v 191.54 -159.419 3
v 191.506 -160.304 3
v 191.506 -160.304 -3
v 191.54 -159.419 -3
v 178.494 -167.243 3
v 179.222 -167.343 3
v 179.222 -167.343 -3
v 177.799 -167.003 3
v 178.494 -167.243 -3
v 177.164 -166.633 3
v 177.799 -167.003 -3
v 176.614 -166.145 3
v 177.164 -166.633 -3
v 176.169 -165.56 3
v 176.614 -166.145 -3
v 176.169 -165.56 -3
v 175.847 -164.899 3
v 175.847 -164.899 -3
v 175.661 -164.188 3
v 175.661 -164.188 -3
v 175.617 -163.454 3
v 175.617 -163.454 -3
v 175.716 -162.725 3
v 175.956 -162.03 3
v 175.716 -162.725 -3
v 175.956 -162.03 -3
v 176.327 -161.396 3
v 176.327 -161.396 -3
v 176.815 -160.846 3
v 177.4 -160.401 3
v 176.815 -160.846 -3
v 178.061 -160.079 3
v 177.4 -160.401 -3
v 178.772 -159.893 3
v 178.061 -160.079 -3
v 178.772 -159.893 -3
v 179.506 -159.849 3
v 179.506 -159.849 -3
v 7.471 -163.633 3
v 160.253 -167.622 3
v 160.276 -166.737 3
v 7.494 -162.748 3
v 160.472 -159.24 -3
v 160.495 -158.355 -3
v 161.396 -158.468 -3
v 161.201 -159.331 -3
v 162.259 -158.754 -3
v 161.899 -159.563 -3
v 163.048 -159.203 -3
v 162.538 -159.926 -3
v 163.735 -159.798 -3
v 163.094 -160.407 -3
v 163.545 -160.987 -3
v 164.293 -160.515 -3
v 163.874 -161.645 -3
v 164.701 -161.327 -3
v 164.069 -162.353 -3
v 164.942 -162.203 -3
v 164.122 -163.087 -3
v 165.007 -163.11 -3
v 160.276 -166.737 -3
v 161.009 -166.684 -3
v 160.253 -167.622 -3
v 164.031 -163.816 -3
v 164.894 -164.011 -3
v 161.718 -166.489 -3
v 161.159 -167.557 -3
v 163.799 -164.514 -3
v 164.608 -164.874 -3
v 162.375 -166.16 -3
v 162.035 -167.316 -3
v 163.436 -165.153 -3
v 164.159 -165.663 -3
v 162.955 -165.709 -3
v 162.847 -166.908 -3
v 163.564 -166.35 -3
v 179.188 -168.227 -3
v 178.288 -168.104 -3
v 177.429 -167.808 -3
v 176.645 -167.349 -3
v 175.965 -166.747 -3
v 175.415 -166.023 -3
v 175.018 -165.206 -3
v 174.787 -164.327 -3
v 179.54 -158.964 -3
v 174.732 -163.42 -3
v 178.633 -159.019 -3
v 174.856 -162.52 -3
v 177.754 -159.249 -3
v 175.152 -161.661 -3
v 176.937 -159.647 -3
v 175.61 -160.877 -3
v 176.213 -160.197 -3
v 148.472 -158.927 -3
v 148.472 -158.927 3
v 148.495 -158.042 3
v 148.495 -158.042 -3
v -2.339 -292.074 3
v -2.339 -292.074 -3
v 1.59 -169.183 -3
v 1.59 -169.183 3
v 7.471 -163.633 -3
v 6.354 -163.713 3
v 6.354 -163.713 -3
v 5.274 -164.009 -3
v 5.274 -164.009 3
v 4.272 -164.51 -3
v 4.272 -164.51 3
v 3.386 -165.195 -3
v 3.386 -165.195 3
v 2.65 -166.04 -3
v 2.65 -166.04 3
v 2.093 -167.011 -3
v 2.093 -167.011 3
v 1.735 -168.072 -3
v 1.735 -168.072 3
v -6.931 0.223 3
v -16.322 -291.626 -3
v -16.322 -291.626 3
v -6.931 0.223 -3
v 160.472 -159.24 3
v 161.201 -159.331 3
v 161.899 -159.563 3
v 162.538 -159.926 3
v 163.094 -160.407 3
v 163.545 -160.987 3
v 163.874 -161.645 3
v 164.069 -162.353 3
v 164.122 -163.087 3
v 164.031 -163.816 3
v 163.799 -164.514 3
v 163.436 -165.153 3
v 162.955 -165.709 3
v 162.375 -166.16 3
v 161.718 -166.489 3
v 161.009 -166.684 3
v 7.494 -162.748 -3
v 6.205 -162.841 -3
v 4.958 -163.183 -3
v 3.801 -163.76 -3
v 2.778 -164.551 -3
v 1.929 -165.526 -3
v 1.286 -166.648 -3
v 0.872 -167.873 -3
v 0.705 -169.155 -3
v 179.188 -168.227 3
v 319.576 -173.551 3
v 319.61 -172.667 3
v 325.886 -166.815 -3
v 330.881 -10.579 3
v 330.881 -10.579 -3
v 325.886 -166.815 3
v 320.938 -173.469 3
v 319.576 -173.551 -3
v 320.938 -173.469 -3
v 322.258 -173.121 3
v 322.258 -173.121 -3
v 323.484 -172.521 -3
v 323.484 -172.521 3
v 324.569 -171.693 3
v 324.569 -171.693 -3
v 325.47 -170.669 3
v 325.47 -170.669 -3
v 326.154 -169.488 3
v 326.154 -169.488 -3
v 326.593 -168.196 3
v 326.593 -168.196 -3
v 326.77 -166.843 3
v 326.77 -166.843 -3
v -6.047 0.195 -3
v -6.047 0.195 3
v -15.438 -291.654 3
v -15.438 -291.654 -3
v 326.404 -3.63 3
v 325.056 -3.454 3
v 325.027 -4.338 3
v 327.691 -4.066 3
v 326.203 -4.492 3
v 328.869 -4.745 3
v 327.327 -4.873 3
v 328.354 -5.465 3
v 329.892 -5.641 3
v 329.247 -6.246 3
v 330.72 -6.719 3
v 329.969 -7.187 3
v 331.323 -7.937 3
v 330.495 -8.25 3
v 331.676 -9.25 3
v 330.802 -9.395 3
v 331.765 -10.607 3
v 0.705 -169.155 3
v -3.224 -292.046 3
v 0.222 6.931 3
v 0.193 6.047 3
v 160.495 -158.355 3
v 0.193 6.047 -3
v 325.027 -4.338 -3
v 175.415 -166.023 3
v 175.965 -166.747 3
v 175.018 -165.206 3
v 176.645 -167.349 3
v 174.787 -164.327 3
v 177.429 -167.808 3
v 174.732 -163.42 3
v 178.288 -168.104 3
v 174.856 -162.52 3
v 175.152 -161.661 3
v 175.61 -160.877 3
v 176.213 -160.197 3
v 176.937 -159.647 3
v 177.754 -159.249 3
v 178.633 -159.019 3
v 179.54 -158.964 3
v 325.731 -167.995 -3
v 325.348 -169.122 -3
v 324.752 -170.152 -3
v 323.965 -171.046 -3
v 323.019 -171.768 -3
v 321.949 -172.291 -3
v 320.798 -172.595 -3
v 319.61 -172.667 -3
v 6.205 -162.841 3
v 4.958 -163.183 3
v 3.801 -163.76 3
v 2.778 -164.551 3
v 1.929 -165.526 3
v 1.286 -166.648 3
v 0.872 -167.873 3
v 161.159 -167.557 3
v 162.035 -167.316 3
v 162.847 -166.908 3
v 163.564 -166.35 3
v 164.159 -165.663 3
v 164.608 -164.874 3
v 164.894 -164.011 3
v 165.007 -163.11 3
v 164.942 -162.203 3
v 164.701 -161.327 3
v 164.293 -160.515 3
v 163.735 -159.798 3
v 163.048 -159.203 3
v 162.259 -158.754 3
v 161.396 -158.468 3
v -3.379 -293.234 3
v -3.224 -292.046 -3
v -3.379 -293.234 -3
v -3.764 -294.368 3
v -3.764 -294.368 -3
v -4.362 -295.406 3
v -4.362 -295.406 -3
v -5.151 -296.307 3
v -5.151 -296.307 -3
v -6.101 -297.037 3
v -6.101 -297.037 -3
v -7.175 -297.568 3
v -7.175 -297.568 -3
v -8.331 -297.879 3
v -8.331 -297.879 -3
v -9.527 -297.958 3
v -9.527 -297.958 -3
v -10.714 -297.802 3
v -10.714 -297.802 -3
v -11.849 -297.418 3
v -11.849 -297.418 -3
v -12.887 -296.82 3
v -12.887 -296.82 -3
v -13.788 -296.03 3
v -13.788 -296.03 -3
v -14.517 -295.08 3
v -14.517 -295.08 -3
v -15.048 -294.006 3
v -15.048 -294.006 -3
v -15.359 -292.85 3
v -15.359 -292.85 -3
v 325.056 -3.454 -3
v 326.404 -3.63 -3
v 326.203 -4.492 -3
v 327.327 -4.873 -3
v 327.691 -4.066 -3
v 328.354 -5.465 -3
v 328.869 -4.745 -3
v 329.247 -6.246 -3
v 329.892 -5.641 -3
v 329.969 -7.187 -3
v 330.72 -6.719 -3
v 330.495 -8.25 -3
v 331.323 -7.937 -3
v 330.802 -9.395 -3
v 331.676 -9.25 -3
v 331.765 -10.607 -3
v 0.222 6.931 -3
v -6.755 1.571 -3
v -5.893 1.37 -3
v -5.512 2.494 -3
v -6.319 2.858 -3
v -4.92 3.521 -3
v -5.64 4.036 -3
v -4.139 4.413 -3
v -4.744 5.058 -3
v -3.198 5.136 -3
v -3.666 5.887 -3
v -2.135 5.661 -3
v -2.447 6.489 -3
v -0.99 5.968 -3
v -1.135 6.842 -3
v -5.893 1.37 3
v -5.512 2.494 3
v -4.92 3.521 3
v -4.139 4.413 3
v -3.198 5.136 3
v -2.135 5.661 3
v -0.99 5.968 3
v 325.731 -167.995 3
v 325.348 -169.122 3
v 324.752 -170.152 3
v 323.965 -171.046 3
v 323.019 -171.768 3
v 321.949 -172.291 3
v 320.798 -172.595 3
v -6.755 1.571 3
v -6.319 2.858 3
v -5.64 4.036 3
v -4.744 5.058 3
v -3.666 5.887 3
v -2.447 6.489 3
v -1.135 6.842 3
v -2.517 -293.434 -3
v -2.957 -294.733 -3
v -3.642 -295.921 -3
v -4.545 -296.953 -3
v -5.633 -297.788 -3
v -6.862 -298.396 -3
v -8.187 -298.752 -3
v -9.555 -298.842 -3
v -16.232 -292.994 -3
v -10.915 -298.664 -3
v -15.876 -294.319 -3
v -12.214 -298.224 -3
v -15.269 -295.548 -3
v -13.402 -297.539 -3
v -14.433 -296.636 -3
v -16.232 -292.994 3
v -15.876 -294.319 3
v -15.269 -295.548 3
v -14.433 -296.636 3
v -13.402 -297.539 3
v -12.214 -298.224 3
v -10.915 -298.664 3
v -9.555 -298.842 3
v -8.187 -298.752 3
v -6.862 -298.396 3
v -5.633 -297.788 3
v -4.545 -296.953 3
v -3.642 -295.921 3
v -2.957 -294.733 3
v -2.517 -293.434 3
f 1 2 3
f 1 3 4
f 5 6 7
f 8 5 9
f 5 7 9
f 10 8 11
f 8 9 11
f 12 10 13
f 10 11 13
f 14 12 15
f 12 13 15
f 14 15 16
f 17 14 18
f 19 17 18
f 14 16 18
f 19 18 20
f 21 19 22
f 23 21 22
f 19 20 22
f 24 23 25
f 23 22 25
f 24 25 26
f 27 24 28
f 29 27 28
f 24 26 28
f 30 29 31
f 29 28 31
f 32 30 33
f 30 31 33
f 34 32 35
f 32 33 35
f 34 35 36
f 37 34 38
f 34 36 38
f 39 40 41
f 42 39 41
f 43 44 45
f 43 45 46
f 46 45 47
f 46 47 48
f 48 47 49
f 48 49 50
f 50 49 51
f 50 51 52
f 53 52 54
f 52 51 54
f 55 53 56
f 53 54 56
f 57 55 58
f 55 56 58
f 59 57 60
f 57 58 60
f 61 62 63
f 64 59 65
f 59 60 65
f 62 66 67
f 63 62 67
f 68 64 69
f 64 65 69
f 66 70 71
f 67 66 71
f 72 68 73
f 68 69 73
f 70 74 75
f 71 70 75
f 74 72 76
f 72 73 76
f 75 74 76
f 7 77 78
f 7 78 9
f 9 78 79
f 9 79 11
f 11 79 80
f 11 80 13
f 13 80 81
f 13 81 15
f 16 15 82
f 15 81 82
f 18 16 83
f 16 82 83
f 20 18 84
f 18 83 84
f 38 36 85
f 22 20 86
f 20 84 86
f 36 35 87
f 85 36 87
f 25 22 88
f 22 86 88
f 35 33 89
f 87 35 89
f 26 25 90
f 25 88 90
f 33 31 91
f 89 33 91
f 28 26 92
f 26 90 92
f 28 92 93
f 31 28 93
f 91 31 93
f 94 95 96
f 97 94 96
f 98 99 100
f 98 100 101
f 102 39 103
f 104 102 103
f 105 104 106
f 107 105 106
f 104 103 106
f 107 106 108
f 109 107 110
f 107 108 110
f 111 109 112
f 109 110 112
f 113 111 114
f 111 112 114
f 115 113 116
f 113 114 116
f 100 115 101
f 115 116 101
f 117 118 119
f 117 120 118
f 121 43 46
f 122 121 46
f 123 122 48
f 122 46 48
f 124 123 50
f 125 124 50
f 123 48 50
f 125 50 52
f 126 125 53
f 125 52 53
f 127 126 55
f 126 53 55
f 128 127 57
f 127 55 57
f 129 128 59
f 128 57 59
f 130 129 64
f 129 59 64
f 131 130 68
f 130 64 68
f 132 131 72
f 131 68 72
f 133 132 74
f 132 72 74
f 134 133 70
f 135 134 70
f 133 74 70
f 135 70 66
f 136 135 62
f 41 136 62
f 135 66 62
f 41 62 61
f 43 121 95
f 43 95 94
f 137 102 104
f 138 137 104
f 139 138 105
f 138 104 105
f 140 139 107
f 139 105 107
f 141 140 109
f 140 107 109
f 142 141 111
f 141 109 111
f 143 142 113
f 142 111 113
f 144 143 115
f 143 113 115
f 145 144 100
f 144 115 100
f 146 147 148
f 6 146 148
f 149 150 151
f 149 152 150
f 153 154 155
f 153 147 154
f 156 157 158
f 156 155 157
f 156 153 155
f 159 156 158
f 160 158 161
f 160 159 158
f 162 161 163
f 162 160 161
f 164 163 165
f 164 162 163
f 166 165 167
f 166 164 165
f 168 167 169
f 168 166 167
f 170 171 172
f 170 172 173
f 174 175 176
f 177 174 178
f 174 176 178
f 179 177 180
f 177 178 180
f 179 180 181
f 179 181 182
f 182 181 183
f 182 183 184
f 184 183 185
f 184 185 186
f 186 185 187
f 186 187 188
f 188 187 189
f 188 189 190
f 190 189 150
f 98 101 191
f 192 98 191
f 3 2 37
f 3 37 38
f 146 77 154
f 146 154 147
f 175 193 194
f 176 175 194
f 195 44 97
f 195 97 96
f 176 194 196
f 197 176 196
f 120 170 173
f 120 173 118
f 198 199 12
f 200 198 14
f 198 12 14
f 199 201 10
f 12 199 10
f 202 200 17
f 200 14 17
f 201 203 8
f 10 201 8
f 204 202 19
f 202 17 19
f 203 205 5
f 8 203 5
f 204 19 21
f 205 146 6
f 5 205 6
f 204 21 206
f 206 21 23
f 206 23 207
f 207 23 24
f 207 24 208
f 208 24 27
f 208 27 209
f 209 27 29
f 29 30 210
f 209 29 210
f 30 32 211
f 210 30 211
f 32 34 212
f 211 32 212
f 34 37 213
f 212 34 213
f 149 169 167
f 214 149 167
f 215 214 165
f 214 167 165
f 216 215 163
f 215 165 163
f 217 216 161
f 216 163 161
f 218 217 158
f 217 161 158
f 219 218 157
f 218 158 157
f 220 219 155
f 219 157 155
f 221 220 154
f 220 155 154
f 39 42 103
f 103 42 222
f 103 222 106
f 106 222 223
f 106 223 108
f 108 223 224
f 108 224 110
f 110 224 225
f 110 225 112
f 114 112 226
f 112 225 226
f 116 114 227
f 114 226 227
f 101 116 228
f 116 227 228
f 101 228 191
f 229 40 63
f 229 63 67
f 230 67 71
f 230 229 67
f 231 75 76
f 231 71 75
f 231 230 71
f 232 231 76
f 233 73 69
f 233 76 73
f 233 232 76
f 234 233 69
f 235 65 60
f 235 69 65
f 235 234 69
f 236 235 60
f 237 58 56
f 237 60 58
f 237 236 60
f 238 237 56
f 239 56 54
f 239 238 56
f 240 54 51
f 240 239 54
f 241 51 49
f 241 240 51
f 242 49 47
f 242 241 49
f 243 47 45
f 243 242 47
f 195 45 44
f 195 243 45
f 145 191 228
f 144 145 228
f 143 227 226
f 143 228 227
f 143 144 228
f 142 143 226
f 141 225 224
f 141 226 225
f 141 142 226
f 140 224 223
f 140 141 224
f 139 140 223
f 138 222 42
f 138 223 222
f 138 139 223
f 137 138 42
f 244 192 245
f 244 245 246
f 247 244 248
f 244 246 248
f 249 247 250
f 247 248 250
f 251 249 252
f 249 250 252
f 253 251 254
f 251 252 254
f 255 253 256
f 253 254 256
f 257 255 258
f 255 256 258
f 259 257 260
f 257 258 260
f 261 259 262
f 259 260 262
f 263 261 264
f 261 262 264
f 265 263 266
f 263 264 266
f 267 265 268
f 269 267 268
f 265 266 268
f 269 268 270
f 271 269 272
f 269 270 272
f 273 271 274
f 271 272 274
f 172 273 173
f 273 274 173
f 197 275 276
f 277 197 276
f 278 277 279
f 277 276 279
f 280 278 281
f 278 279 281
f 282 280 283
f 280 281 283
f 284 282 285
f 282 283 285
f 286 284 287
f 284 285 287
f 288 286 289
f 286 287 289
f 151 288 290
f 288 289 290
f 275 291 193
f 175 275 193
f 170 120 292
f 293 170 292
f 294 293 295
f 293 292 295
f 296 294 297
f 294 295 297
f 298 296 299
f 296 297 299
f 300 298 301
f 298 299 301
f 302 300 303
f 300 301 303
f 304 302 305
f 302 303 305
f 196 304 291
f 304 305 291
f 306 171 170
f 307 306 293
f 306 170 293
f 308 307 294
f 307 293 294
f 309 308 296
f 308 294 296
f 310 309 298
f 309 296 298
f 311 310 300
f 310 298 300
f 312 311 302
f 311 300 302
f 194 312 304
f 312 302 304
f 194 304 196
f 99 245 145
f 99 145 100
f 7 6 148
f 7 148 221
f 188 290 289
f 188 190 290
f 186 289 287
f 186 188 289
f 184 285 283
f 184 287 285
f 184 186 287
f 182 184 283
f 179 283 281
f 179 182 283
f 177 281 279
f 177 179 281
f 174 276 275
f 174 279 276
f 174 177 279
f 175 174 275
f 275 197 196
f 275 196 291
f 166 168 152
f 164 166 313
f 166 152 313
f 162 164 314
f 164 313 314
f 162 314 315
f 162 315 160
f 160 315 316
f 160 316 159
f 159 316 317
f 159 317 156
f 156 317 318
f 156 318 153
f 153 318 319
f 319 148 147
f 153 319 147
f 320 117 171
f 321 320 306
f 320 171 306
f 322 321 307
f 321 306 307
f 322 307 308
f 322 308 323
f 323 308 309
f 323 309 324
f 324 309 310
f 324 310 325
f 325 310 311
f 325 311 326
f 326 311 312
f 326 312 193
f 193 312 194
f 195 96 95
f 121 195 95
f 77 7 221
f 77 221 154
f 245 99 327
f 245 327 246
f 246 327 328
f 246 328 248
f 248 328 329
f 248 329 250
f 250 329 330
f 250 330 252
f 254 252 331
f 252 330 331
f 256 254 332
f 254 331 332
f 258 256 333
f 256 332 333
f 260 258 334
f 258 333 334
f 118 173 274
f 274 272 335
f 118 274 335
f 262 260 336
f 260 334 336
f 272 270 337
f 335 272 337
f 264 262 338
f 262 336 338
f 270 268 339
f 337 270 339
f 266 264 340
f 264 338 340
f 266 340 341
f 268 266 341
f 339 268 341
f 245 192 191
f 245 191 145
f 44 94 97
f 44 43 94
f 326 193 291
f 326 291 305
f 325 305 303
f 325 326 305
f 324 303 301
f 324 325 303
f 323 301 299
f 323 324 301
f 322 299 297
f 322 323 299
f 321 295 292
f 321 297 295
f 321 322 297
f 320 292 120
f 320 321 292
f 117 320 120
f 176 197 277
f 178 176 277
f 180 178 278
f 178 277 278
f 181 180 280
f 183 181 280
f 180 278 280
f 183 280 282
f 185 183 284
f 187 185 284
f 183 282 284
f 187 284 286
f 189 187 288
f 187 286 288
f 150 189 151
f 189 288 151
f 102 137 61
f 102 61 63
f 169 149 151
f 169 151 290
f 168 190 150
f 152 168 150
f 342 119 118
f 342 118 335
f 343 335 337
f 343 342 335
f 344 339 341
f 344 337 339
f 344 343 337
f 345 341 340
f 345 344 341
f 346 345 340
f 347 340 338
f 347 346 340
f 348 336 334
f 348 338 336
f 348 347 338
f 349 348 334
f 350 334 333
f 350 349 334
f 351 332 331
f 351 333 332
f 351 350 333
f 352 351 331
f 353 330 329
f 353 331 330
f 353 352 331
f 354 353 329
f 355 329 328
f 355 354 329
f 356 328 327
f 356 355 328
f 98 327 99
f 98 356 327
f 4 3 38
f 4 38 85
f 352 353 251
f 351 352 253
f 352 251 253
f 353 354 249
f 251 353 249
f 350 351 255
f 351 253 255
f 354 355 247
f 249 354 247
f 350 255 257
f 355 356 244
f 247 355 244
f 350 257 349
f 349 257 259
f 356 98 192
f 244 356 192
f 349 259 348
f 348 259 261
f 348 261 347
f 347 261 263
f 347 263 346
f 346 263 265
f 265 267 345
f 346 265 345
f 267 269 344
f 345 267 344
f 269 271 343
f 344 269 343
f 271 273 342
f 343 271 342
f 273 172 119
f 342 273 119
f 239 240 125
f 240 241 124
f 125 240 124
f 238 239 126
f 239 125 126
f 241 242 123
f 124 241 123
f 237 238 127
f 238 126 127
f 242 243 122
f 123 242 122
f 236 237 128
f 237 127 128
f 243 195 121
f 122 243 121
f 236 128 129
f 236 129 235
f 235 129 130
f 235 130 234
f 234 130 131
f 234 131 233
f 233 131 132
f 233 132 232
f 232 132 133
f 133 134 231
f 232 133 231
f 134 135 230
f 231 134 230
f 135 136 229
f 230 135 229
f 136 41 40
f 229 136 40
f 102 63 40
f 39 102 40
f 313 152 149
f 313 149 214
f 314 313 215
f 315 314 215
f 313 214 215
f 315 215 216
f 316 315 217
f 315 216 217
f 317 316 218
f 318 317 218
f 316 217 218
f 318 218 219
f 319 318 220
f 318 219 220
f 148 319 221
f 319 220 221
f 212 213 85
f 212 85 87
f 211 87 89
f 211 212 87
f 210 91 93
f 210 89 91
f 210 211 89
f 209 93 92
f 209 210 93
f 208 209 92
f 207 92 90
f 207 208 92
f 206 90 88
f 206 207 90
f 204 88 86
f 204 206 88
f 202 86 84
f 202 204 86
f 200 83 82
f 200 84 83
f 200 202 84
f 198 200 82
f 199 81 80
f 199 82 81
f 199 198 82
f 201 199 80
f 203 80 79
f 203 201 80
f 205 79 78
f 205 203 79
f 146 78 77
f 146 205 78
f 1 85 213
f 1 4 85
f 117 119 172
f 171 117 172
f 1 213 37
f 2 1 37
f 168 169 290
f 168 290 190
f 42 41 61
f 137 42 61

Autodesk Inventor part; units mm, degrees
ref_plane "YZ Plane" through (0, 0, 0) normal (1, 0, 0) x (0, 1, 0)
ref_plane "XZ Plane" through (0, 0, 0) normal (0, 1, 0) x (-1, 0, 0)
sketch "Sketch1" plane through (0, 0, 0) normal (0, 0, 1) x (1, 0, 0)
  circle A0 centre (0, 0) radius 6.05
surface extrude "ExtrusionSrf1" sketch "Sketch1" along normal mid plane 6 shown yes curves A0
sketch "Sketch2" plane through (0, 0, 0) normal (0, 0, 1) x (1, 0, 0)
  circle A0 centre (324.834, -10.3853) radius 6.05
  point P0 (0, 0)
surface extrude "ExtrusionSrf2" sketch "Sketch2" along normal mid plane 6 shown yes curves A0
sketch "Sketch3" plane through (0, 0, 0) normal (0, 0, 1) x (1, 0, 0)
  circle A0 centre (-9.3308, -291.8509) radius 6.11
  point P0 (0, 0)
surface extrude "ExtrusionSrf3" sketch "Sketch3" along normal blind 6 shown yes curves A0
sketch "Sketch4" plane through (0, 0, 0) normal (0, 0, 1) x (1, 0, 0)
  circle A0 centre (7.3217, -169.3662) radius 5.735
  point P0 (0, 0)
surface extrude "ExtrusionSrf4" sketch "Sketch4" along normal mid plane 6 shown yes curves A0
sketch "Sketch5" plane through (0, 0, 0) normal (0, 0, 1) x (1, 0, 0)
  circle A0 centre (319.839, -166.6212) radius 6.05
  point P0 (0, 0)
surface extrude "ExtrusionSrf5" sketch "Sketch5" along normal mid plane 6 shown yes curves A0
sketch "Sketch6" plane through (0, 0, 0) normal (0, 0, 1) x (1, 0, 0)
  circle A0 centre (160.3736, -162.9887) radius 3
  point P0 (0, 0)
surface extrude "ExtrusionSrf6" sketch "Sketch6" along normal mid plane 6 shown yes curves A0
sketch "Sketch7" plane through (0, 0, 0) normal (0, 0, 1) x (1, 0, 0)
  circle A0 centre (179.3639, -163.5958) radius 3
  point P0 (0, 0)
surface extrude "ExtrusionSrf7" sketch "Sketch7" along normal mid plane 6 shown yes curves A0
sketch "Sketch8" plane through (0, 0, 0) normal (0, 0, 1) x (1, 0, 0)
  circle A0 centre (0, 0) radius 6.05 projected
  circle A1 centre (7.3217, -169.3662) radius 5.735 projected
  circle A2 centre (-9.3308, -291.8509) radius 6.11 projected
  circle A3 centre (160.3736, -162.9887) radius 3 projected
  circle A4 centre (179.3639, -163.5958) radius 3 projected
  circle A5 centre (319.839, -166.6212) radius 6.05 projected
  circle A6 centre (324.834, -10.3853) radius 6.05 projected
  arc A7 (0.2015, 6.3018) -> (-6.3017, 0.2028) centre (0, 0) ccw
  arc A8 (-15.6925, -291.6462) -> (-2.969, -292.0543) centre (-9.3308, -291.8509) ccw
  arc A9 (7.4878, -163.0034) -> (0.9599, -169.1628) centre (7.3217, -169.3662) ccw
  arc A10 (160.2691, -166.9923) -> (160.4782, -158.985) centre (160.3736, -162.9887) ccw
  arc A11 (331.1358, -10.5868) -> (325.0355, -4.0835) centre (324.834, -10.3853) ccw
  arc A12 (179.5157, -159.5937) -> (179.2122, -167.5979) centre (179.3639, -163.5958) ccw
  arc A13 (319.6001, -172.9217) -> (326.1408, -166.8227) centre (319.839, -166.6212) ccw
  line L0 (-15.6925, -291.6462) -> (-6.3017, 0.2028)
  line L1 (0.2015, 6.3018) -> (325.0355, -4.0835)
  line L2 (-2.969, -292.0543) -> (0.9599, -169.1628)
  line L3 (7.4878, -163.0034) -> (160.2691, -166.9923)
  line L4 (331.1358, -10.5868) -> (326.1408, -166.8227)
  line L5 (148.4782, -158.6717) -> (160.4782, -158.985)
  line L6 (179.2122, -167.5979) -> (319.6001, -172.9217)
  line L7 (179.5157, -159.5937) -> (191.5157, -160.0488)
  dimension "d14" = 0.255
  dimension "d15" = 0.255
  dimension "d16" = 0.255
  dimension "d17" = 0.63
  dimension "d19" = 0.255
  dimension "d22" = 1.005
  dimension "d23" = 1.005
  dimension "d35" = 12
  dimension "d36" = 12
ref_plane "Work Plane2" through (191.5157, -160.0488, 0) normal (0.9992817, -0.0378944, 0) x (0.0378944, 0.9992817, 0)
sketch "Sketch10" plane through (191.5157, -160.0488, 0) normal (0.9992817, -0.0378944, 0) x (0.0378944, 0.9992817, 0)
  line L0 (0.63, 3) -> (-0.255, 3)
  line L1 (-0.255, 3) -> (-0.255, -3)
  line L2 (-0.255, -3) -> (0.63, -3)
  line L3 (0.63, -3) -> (0.63, 3)
  line L4 (0.63, 0) -> (-0.255, 0) construction
  point P0 (152.6764, 0)
  point P1 (0, 0)
  dimension "d29" = 6
  dimension "d30" = 0.63
  dimension "d31" = 0.255
sweep "Sweep2" add profiles "Sketch10" path "Sketch8" path curves L7 A12 L6 A13 L4 A11 L1 A7 L0 A8 L2 A9 L3 A10 L5
equation "\"d14\" = inside"
equation "\"d15\" = inside"
equation "\"d16\" = inside"
equation "\"d17\" = backside"
equation "\"d19\" = inside"
equation "\"d30\" = backside"
equation "\"d31\" = inside"
equation "\"inside\" = 0.255"
equation "\"backside\" = 0.63"
properties part number "Belt 2" material "Rubber"
